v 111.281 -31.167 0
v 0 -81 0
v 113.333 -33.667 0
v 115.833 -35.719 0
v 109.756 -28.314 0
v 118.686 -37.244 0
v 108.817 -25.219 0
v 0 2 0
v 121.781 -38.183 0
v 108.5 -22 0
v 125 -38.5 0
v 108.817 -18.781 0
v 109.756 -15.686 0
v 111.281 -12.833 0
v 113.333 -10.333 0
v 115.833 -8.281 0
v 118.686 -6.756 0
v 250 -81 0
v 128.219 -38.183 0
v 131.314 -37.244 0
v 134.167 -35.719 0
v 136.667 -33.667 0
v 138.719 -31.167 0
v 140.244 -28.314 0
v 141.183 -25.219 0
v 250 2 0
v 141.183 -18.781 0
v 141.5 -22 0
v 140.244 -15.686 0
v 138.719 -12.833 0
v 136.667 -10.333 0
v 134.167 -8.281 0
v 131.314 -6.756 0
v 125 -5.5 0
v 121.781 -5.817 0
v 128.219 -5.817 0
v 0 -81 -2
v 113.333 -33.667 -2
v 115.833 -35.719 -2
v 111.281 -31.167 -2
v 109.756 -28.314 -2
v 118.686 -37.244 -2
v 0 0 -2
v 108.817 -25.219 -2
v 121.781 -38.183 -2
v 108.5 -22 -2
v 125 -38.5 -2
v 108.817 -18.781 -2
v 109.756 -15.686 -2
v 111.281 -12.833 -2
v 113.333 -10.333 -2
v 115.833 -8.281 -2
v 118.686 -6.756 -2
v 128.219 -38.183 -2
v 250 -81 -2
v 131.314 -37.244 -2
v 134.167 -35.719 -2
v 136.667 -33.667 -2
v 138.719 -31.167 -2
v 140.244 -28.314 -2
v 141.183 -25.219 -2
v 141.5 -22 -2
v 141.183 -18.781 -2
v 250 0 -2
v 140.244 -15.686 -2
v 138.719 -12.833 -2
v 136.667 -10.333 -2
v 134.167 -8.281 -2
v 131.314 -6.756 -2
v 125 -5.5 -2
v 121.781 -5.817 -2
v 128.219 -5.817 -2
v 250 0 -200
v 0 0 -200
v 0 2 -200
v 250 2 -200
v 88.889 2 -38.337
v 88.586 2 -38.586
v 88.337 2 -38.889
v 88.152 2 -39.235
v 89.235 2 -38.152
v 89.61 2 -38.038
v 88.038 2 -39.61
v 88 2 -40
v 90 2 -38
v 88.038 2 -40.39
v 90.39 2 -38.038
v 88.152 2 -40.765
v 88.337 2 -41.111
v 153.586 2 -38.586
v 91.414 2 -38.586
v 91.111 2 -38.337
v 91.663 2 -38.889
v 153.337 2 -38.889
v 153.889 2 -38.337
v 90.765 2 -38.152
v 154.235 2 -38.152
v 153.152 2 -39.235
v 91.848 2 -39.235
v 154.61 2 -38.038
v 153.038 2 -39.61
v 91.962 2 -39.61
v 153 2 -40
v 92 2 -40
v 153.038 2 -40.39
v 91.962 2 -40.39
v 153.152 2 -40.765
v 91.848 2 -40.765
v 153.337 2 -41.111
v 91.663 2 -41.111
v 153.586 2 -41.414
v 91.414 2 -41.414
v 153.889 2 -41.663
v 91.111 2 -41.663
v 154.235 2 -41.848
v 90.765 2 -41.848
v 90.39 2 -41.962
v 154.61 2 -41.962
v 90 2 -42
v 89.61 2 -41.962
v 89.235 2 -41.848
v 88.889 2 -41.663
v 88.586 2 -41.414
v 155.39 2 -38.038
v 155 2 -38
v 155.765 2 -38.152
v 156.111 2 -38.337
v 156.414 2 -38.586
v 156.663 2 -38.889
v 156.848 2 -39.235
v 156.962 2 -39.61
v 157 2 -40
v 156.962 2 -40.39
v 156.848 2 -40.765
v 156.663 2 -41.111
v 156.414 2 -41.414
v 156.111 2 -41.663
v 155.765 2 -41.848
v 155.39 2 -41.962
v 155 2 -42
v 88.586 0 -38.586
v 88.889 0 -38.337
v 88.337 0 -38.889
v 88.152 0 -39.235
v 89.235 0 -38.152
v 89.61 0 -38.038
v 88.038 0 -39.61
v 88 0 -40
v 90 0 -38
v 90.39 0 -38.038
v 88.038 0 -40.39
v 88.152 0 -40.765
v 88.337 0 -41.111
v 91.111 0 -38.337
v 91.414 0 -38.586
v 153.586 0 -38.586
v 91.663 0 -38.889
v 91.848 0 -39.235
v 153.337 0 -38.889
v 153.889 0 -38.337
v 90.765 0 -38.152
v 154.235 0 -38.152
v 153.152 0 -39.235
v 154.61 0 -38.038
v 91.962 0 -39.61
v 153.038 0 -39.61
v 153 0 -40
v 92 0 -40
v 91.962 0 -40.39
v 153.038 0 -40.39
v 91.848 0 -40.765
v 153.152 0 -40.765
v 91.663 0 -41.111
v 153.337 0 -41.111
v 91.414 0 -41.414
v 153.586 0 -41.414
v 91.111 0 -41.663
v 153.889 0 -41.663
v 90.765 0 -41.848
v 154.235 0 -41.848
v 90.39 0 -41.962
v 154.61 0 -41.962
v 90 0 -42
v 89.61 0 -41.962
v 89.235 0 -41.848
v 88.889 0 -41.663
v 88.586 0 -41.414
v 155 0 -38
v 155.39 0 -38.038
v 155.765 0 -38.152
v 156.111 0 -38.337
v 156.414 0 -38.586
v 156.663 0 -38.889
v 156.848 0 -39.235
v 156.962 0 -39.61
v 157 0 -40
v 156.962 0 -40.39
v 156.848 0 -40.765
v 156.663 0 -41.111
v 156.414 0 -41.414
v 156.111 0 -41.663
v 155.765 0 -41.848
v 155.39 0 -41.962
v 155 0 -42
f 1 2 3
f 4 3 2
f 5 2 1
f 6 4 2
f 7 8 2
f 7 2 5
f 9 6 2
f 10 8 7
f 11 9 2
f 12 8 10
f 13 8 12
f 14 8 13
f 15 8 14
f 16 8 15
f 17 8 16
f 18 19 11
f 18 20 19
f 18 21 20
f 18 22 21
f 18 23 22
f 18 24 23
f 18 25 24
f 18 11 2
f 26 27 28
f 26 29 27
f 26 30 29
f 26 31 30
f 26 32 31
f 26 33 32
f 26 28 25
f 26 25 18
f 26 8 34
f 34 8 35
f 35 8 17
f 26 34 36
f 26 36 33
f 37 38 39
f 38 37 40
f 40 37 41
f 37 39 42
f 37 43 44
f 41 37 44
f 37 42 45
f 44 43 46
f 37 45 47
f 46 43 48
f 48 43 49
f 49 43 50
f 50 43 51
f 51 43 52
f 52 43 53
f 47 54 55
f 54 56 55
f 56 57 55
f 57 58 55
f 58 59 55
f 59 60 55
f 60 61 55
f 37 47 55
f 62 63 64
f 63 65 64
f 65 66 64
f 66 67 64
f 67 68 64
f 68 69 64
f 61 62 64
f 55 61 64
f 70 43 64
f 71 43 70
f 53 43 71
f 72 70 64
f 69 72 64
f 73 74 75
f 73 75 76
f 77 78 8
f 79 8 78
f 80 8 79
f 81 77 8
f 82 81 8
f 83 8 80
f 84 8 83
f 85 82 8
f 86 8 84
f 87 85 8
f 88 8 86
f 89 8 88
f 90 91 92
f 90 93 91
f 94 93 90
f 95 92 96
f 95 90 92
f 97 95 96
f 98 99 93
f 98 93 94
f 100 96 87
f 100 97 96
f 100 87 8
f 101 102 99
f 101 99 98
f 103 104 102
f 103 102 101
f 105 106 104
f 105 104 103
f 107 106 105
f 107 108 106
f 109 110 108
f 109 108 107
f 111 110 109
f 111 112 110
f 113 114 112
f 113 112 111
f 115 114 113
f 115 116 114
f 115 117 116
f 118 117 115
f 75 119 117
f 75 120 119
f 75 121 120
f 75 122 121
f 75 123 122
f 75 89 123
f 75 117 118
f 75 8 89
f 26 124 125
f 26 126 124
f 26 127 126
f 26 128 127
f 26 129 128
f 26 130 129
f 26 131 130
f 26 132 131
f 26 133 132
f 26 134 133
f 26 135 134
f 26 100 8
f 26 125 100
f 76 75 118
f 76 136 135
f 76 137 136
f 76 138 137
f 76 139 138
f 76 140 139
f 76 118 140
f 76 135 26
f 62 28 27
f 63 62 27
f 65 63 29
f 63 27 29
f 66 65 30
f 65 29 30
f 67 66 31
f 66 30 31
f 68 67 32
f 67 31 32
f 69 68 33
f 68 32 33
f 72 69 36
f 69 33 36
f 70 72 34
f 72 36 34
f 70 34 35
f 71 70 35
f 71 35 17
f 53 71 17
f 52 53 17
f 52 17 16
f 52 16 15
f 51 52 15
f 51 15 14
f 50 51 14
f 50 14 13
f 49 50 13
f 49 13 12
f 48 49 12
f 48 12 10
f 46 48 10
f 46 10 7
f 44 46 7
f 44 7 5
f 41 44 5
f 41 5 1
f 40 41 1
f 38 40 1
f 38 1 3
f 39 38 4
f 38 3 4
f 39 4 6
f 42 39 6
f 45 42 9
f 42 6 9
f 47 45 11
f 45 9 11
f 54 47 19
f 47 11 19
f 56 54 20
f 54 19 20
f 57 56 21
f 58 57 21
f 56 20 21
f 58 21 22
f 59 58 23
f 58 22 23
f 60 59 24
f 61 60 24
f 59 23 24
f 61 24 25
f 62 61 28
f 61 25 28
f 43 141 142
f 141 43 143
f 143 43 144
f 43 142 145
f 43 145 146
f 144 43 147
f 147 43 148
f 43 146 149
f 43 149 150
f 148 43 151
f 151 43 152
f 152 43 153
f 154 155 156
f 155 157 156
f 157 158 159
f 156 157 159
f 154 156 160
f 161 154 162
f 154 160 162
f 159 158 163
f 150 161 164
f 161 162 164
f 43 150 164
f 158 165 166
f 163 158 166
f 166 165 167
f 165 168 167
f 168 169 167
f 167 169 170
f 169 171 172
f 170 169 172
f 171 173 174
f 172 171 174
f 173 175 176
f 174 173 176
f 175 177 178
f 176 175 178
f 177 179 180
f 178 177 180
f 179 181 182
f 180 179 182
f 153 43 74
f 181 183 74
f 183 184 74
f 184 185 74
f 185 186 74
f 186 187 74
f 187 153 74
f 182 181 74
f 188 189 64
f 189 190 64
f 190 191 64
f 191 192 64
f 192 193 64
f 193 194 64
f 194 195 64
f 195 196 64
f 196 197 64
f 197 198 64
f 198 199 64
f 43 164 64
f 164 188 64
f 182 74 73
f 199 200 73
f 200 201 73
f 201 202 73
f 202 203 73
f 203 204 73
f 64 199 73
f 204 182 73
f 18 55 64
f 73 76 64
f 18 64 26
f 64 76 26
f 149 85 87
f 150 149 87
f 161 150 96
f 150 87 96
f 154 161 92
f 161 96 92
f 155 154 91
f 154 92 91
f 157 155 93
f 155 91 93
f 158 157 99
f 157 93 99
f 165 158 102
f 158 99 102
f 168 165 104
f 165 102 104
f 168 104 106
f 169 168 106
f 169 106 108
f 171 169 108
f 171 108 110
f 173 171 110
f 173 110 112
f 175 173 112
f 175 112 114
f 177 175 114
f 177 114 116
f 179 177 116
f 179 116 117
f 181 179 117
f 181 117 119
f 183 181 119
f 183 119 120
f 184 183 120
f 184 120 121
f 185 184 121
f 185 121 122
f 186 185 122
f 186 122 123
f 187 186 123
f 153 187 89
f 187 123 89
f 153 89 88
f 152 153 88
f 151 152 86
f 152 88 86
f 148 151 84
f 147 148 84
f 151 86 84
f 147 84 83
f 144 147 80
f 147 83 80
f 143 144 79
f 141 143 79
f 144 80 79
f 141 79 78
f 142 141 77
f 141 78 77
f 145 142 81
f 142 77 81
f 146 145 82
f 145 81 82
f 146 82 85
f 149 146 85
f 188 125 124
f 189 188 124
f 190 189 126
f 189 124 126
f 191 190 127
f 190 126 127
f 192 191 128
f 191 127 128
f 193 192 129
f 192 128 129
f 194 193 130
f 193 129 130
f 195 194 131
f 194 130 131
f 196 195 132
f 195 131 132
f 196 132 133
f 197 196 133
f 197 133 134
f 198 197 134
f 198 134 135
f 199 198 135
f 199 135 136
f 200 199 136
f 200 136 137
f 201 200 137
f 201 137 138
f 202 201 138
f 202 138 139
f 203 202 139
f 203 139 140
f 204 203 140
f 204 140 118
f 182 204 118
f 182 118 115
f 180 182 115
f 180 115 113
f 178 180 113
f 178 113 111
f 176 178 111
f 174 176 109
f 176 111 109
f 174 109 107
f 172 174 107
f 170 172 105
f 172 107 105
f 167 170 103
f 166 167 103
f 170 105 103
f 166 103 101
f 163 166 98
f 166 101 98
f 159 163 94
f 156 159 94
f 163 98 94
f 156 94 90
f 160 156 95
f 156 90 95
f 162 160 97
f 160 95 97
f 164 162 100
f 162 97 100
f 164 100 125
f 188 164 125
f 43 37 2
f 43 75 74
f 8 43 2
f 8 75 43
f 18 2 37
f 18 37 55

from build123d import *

# Parameters (mm, degrees)
SKETCH1_W           = 250
SKETCH1_H           = 200
BOSS_EXTRUDE1_DEPTH = 2
SKETCH2_W           = 250
SKETCH2_H           = 2
BOSS_EXTRUDE2_DEPTH = 81
SKETCH3_R           = 2
CUT_EXTRUDE1_DEPTH  = 331.740079216
CUT_EXTRUDE2_REACH  = 332.244
SKETCH4_R           = 16.5


with BuildPart() as part:
    # Sketch1 → Boss-Extrude1 (new body)
    with BuildSketch(Plane(origin=(0, 0, 0), x_dir=(1, 0, 0), z_dir=(0, 1, 0))):
        with Locations((125, 100)):
            Rectangle(SKETCH1_W, SKETCH1_H)
    extrude(amount=BOSS_EXTRUDE1_DEPTH)

    # Sketch2 → Boss-Extrude2 (add)
    with BuildSketch(Plane.XZ):
        with Locations((125, -1)):
            Rectangle(SKETCH2_W, SKETCH2_H)
    extrude(amount=BOSS_EXTRUDE2_DEPTH)

    # Sketch3 → Cut-Extrude1 (cut, through all)
    with BuildSketch(Plane(origin=(0, 2, 0), x_dir=(1, 0, 0), z_dir=(0, 1, 0))):
        with Locations(Location((155, 40, 0), (0, 0, 270))):
            Circle(SKETCH3_R)
        with Locations(Location((90, 40, 0), (0, 0, 270))):
            Circle(SKETCH3_R)
    extrude(amount=-CUT_EXTRUDE1_DEPTH, mode=Mode.SUBTRACT)

    # Sketch4 → Cut-Extrude2 (cut, up to next)
    with BuildSketch(Plane.XY, mode=Mode.PRIVATE) as cut_extrude2_sk1:
        with Locations((125, -22)):
            Circle(SKETCH4_R)
    cut_extrude2_tool1 = extrude(cut_extrude2_sk1.sketch, amount=-CUT_EXTRUDE2_REACH, mode=Mode.PRIVATE) & part.part
    add(cut_extrude2_tool1.solids().sort_by_distance((125, -22, 0))[0], mode=Mode.SUBTRACT)


solid = part.part
